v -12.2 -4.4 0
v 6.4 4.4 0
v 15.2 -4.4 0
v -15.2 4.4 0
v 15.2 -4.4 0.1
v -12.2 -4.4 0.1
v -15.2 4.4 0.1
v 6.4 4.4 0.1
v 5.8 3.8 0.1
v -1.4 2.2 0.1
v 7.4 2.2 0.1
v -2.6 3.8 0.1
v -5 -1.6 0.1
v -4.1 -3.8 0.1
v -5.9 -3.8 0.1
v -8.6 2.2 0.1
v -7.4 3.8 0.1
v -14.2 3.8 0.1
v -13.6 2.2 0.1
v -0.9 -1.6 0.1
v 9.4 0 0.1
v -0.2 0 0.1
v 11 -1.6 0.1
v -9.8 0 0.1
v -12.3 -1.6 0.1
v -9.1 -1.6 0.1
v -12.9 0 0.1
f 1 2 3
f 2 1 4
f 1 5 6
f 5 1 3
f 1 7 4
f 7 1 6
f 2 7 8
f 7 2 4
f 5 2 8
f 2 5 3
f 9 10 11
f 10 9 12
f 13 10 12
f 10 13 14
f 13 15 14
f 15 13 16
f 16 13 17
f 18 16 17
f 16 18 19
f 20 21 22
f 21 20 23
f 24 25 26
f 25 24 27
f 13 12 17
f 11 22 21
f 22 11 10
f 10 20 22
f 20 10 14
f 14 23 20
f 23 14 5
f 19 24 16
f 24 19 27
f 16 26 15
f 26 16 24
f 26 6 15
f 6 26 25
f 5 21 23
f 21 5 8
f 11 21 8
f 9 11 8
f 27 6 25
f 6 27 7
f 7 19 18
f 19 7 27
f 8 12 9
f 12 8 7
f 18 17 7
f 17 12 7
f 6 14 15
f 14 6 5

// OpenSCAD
// file: ../p/4-4edge.scad
use <../lib.scad>
$fa=1; $fs=0.2;
function ldraw_lib__4_4edge(realsolid=false) = [
// 0 Circle 1.0
// 0 Name: 4-4edge.dat
// 0 Author: James Jessiman
// 0 !LDRAW_ORG Primitive UPDATE 2017-01
// 0 !LICENSE Licensed under CC BY 2.0 and CC BY 4.0 : see CAreadme.txt
// 
// 0 BFC CERTIFY CCW
  [0,"BFC","CERTIFY"],
  [0,"BFC","CCW"],
// 
// 0 !HISTORY 1998-12-15 [PTadmin] Official Update 1998-10
// 0 !HISTORY 2005-12-28 [PTadmin] Official Update 2005-01
// 0 !HISTORY 2007-06-24 [PTadmin] Header formatted for Contributor Agreement
// 0 !HISTORY 2008-07-01 [PTadmin] Official Update 2008-01
// 0 !HISTORY 2017-01-15 [Steffen] BFCed
// 0 !HISTORY 2017-12-30 [PTadmin] Official Update 2017-01
// 
// 
// 2 24 1 0 0 0.9239 0 0.3827
  [2,24,1,0,0,0.9239,0,0.3827],
// 2 24 0.9239 0 0.3827 0.7071 0 0.7071
  [2,24,0.9239,0,0.3827,0.7071,0,0.7071],
// 2 24 0.7071 0 0.7071 0.3827 0 0.9239
  [2,24,0.7071,0,0.7071,0.3827,0,0.9239],
// 2 24 0.3827 0 0.9239 0 0 1
  [2,24,0.3827,0,0.9239,0,0,1],
// 2 24 0 0 1 -0.3827 0 0.9239
  [2,24,0,0,1,-0.3827,0,0.9239],
// 2 24 -0.3827 0 0.9239 -0.7071 0 0.7071
  [2,24,-0.3827,0,0.9239,-0.7071,0,0.7071],
// 2 24 -0.7071 0 0.7071 -0.9239 0 0.3827
  [2,24,-0.7071,0,0.7071,-0.9239,0,0.3827],
// 2 24 -0.9239 0 0.3827 -1 0 -0
  [2,24,-0.9239,0,0.3827,-1,0,-0],
// 2 24 -1 0 -0 -0.9239 0 -0.3827
  [2,24,-1,0,-0,-0.9239,0,-0.3827],
// 2 24 -0.9239 0 -0.3827 -0.7071 0 -0.7071
  [2,24,-0.9239,0,-0.3827,-0.7071,0,-0.7071],
// 2 24 -0.7071 0 -0.7071 -0.3827 0 -0.9239
  [2,24,-0.7071,0,-0.7071,-0.3827,0,-0.9239],
// 2 24 -0.3827 0 -0.9239 0 0 -1
  [2,24,-0.3827,0,-0.9239,0,0,-1],
// 2 24 0 0 -1 0.3827 0 -0.9239
  [2,24,0,0,-1,0.3827,0,-0.9239],
// 2 24 0.3827 0 -0.9239 0.7071 0 -0.7071
  [2,24,0.3827,0,-0.9239,0.7071,0,-0.7071],
// 2 24 0.7071 0 -0.7071 0.9239 0 -0.3827
  [2,24,0.7071,0,-0.7071,0.9239,0,-0.3827],
// 2 24 0.9239 0 -0.3827 1 0 0
  [2,24,0.9239,0,-0.3827,1,0,0],
];
module ldraw_lib__4_4edge(step=0, col=false, unit=2/5, alt=false, line=0.2, solid=!$preview)
    makepoly(ldraw_lib__4_4edge(solid), step=step, col=col, unit=unit, alt=alt, line=line, solid=solid);
ldraw_lib__4_4edge(line=0.2);
// file: ../p/4-4disc.scad
use <../lib.scad>
$fa=1; $fs=0.2;
function ldraw_lib__4_4disc(realsolid=false) = [
// 0 Disc 1.0
// 0 Name: 4-4disc.dat
// 0 Author: James Jessiman
// 0 !LDRAW_ORG Primitive UPDATE 2002-02
// 0 !LICENSE Licensed under CC BY 2.0 and CC BY 4.0 : see CAreadme.txt
// 
// 0 BFC CERTIFY CCW
  [0,"BFC","CERTIFY"],
  [0,"BFC","CCW"],
// 
// 0 !HISTORY 1998-12-15 [PTadmin] Official Update 1998-10
// 0 !HISTORY 2002-03-23 [sbliss] Added BFC statement
// 0 !HISTORY 2002-04-25 [PTadmin] Official Update 2002-02
// 0 !HISTORY 2007-06-24 [PTadmin] Header formatted for Contributor Agreement
// 0 !HISTORY 2008-07-01 [PTadmin] Official Update 2008-01
// 
// 
// 3 16 0 0 0 1 0 0 0.9239 0 0.3827
  [3,16,0,0,0,1,0,0,0.9239,0,0.3827],
// 3 16 0 0 0 0.9239 0 0.3827 0.7071 0 0.7071
  [3,16,0,0,0,0.9239,0,0.3827,0.7071,0,0.7071],
// 3 16 0 0 0 0.7071 0 0.7071 0.3827 0 0.9239
  [3,16,0,0,0,0.7071,0,0.7071,0.3827,0,0.9239],
// 3 16 0 0 0 0.3827 0 0.9239 0 0 1
  [3,16,0,0,0,0.3827,0,0.9239,0,0,1],
// 3 16 0 0 0 0 0 1 -0.3827 0 0.9239
  [3,16,0,0,0,0,0,1,-0.3827,0,0.9239],
// 3 16 0 0 0 -0.3827 0 0.9239 -0.7071 0 0.7071
  [3,16,0,0,0,-0.3827,0,0.9239,-0.7071,0,0.7071],
// 3 16 0 0 0 -0.7071 0 0.7071 -0.9239 0 0.3827
  [3,16,0,0,0,-0.7071,0,0.7071,-0.9239,0,0.3827],
// 3 16 0 0 0 -0.9239 0 0.3827 -1 0 -0
  [3,16,0,0,0,-0.9239,0,0.3827,-1,0,-0],
// 3 16 0 0 0 -1 0 -0 -0.9239 0 -0.3827
  [3,16,0,0,0,-1,0,-0,-0.9239,0,-0.3827],
// 3 16 0 0 0 -0.9239 0 -0.3827 -0.7071 0 -0.7071
  [3,16,0,0,0,-0.9239,0,-0.3827,-0.7071,0,-0.7071],
// 3 16 0 0 0 -0.7071 0 -0.7071 -0.3827 0 -0.9239
  [3,16,0,0,0,-0.7071,0,-0.7071,-0.3827,0,-0.9239],
// 3 16 0 0 0 -0.3827 0 -0.9239 0 0 -1
  [3,16,0,0,0,-0.3827,0,-0.9239,0,0,-1],
// 3 16 0 0 0 0 0 -1 0.3827 0 -0.9239
  [3,16,0,0,0,0,0,-1,0.3827,0,-0.9239],
// 3 16 0 0 0 0.3827 0 -0.9239 0.7071 0 -0.7071
  [3,16,0,0,0,0.3827,0,-0.9239,0.7071,0,-0.7071],
// 3 16 0 0 0 0.7071 0 -0.7071 0.9239 0 -0.3827
  [3,16,0,0,0,0.7071,0,-0.7071,0.9239,0,-0.3827],
// 3 16 0 0 0 0.9239 0 -0.3827 1 0 0
  [3,16,0,0,0,0.9239,0,-0.3827,1,0,0],
// 0
];
module ldraw_lib__4_4disc(step=0, col=false, unit=2/5, alt=false, line=0.2, solid=!$preview)
    makepoly(ldraw_lib__4_4disc(solid), step=step, col=col, unit=unit, alt=alt, line=line, solid=solid);
ldraw_lib__4_4disc(line=0.2);
// file: ../p/4-4cyli.scad
use <../lib.scad>
$fa=1; $fs=0.2;
function ldraw_lib__4_4cyli(realsolid=false) = [
// 0 Cylinder 1.0
// 0 Name: 4-4cyli.dat
// 0 Author: James Jessiman
// 0 !LDRAW_ORG Primitive UPDATE 2005-01
// 0 !LICENSE Licensed under CC BY 2.0 and CC BY 4.0 : see CAreadme.txt
// 
// 0 BFC CERTIFY CCW
  [0,"BFC","CERTIFY"],
  [0,"BFC","CCW"],
// 
// 0 !HISTORY 1998-12-15 [PTadmin] Official Update 1998-10
// 0 !HISTORY 2002-03-23 [sbliss] Added BFC statement; merged headers from files in distributions LDraw 0.27 and Complete.
// 0 !HISTORY 2002-04-25 [PTadmin] Official Update 2002-02
// 0 !HISTORY 2004-12-14 [guyvivan] BFC CCW
// 0 !HISTORY 2005-12-28 [PTadmin] Official Update 2005-01
// 0 !HISTORY 2007-06-24 [PTadmin] Header formatted for Contributor Agreement
// 0 !HISTORY 2008-07-01 [PTadmin] Official Update 2008-01
// 
// 
// 4 16 1 1 0 0.9239 1 0.3827 0.9239 0 0.3827 1 0 0
  [4,16,1,1,0,0.9239,1,0.3827,0.9239,0,0.3827,1,0,0],
// 5 24 1 0 0 1 1 0 0.9239 0 0.3827 0.9239 0 -0.3827
  [5,24,1,0,0,1,1,0,0.9239,0,0.3827,0.9239,0,-0.3827],
// 4 16 0.9239 1 0.3827 0.7071 1 0.7071 0.7071 0 0.7071 0.9239 0 0.3827
  [4,16,0.9239,1,0.3827,0.7071,1,0.7071,0.7071,0,0.7071,0.9239,0,0.3827],
// 5 24 0.9239 0 0.3827 0.9239 1 0.3827 0.7071 0 0.7071 1 0 0
  [5,24,0.9239,0,0.3827,0.9239,1,0.3827,0.7071,0,0.7071,1,0,0],
// 4 16 0.7071 1 0.7071 0.3827 1 0.9239 0.3827 0 0.9239 0.7071 0 0.7071
  [4,16,0.7071,1,0.7071,0.3827,1,0.9239,0.3827,0,0.9239,0.7071,0,0.7071],
// 5 24 0.7071 0 0.7071 0.7071 1 0.7071 0.3827 0 0.9239 0.9239 0 0.3827
  [5,24,0.7071,0,0.7071,0.7071,1,0.7071,0.3827,0,0.9239,0.9239,0,0.3827],
// 4 16 0.3827 1 0.9239 0 1 1 0 0 1 0.3827 0 0.9239
  [4,16,0.3827,1,0.9239,0,1,1,0,0,1,0.3827,0,0.9239],
// 5 24 0.3827 0 0.9239 0.3827 1 0.9239 0 0 1 0.7071 0 0.7071
  [5,24,0.3827,0,0.9239,0.3827,1,0.9239,0,0,1,0.7071,0,0.7071],
// 4 16 0 1 1 -0.3827 1 0.9239 -0.3827 0 0.9239 0 0 1
  [4,16,0,1,1,-0.3827,1,0.9239,-0.3827,0,0.9239,0,0,1],
// 5 24 0 0 1 0 1 1 -0.3827 0 0.9239 0.3827 0 0.9239
  [5,24,0,0,1,0,1,1,-0.3827,0,0.9239,0.3827,0,0.9239],
// 4 16 -0.3827 1 0.9239 -0.7071 1 0.7071 -0.7071 0 0.7071 -0.3827 0 0.9239
  [4,16,-0.3827,1,0.9239,-0.7071,1,0.7071,-0.7071,0,0.7071,-0.3827,0,0.9239],
// 5 24 -0.3827 0 0.9239 -0.3827 1 0.9239 -0.7071 0 0.7071 0 0 1
  [5,24,-0.3827,0,0.9239,-0.3827,1,0.9239,-0.7071,0,0.7071,0,0,1],
// 4 16 -0.7071 1 0.7071 -0.9239 1 0.3827 -0.9239 0 0.3827 -0.7071 0 0.7071
  [4,16,-0.7071,1,0.7071,-0.9239,1,0.3827,-0.9239,0,0.3827,-0.7071,0,0.7071],
// 5 24 -0.7071 0 0.7071 -0.7071 1 0.7071 -0.9239 0 0.3827 -0.3827 0 0.9239
  [5,24,-0.7071,0,0.7071,-0.7071,1,0.7071,-0.9239,0,0.3827,-0.3827,0,0.9239],
// 4 16 -0.9239 1 0.3827 -1 1 0 -1 0 0 -0.9239 0 0.3827
  [4,16,-0.9239,1,0.3827,-1,1,0,-1,0,0,-0.9239,0,0.3827],
// 5 24 -0.9239 0 0.3827 -0.9239 1 0.3827 -1 0 0 -0.7071 0 0.7071
  [5,24,-0.9239,0,0.3827,-0.9239,1,0.3827,-1,0,0,-0.7071,0,0.7071],
// 4 16 -1 1 0 -0.9239 1 -0.3827 -0.9239 0 -0.3827 -1 0 0
  [4,16,-1,1,0,-0.9239,1,-0.3827,-0.9239,0,-0.3827,-1,0,0],
// 5 24 -1 0 0 -1 1 0 -0.9239 0 -0.3827 -0.9239 0 0.3827
  [5,24,-1,0,0,-1,1,0,-0.9239,0,-0.3827,-0.9239,0,0.3827],
// 4 16 -0.9239 1 -0.3827 -0.7071 1 -0.7071 -0.7071 0 -0.7071 -0.9239 0 -0.3827
  [4,16,-0.9239,1,-0.3827,-0.7071,1,-0.7071,-0.7071,0,-0.7071,-0.9239,0,-0.3827],
// 5 24 -0.9239 0 -0.3827 -0.9239 1 -0.3827 -0.7071 0 -0.7071 -1 0 0
  [5,24,-0.9239,0,-0.3827,-0.9239,1,-0.3827,-0.7071,0,-0.7071,-1,0,0],
// 4 16 -0.7071 1 -0.7071 -0.3827 1 -0.9239 -0.3827 0 -0.9239 -0.7071 0 -0.7071
  [4,16,-0.7071,1,-0.7071,-0.3827,1,-0.9239,-0.3827,0,-0.9239,-0.7071,0,-0.7071],
// 5 24 -0.7071 0 -0.7071 -0.7071 1 -0.7071 -0.3827 0 -0.9239 -0.9239 0 -0.3827
  [5,24,-0.7071,0,-0.7071,-0.7071,1,-0.7071,-0.3827,0,-0.9239,-0.9239,0,-0.3827],
// 4 16 -0.3827 1 -0.9239 0 1 -1 0 0 -1 -0.3827 0 -0.9239
  [4,16,-0.3827,1,-0.9239,0,1,-1,0,0,-1,-0.3827,0,-0.9239],
// 5 24 -0.3827 0 -0.9239 -0.3827 1 -0.9239 0 0 -1 -0.7071 0 -0.7071
  [5,24,-0.3827,0,-0.9239,-0.3827,1,-0.9239,0,0,-1,-0.7071,0,-0.7071],
// 4 16 0 1 -1 0.3827 1 -0.9239 0.3827 0 -0.9239 0 0 -1
  [4,16,0,1,-1,0.3827,1,-0.9239,0.3827,0,-0.9239,0,0,-1],
// 5 24 0 0 -1 0 1 -1 0.3827 0 -0.9239 -0.3827 0 -0.9239
  [5,24,0,0,-1,0,1,-1,0.3827,0,-0.9239,-0.3827,0,-0.9239],
// 4 16 0.3827 1 -0.9239 0.7071 1 -0.7071 0.7071 0 -0.7071 0.3827 0 -0.9239
  [4,16,0.3827,1,-0.9239,0.7071,1,-0.7071,0.7071,0,-0.7071,0.3827,0,-0.9239],
// 5 24 0.3827 0 -0.9239 0.3827 1 -0.9239 0.7071 0 -0.7071 0 0 -1
  [5,24,0.3827,0,-0.9239,0.3827,1,-0.9239,0.7071,0,-0.7071,0,0,-1],
// 4 16 0.7071 1 -0.7071 0.9239 1 -0.3827 0.9239 0 -0.3827 0.7071 0 -0.7071
  [4,16,0.7071,1,-0.7071,0.9239,1,-0.3827,0.9239,0,-0.3827,0.7071,0,-0.7071],
// 5 24 0.7071 0 -0.7071 0.7071 1 -0.7071 0.9239 0 -0.3827 0.3827 0 -0.9239
  [5,24,0.7071,0,-0.7071,0.7071,1,-0.7071,0.9239,0,-0.3827,0.3827,0,-0.9239],
// 4 16 0.9239 1 -0.3827 1 1 0 1 0 0 0.9239 0 -0.3827
  [4,16,0.9239,1,-0.3827,1,1,0,1,0,0,0.9239,0,-0.3827],
// 5 24 0.9239 0 -0.3827 0.9239 1 -0.3827 1 0 0 0.7071 0 -0.7071
  [5,24,0.9239,0,-0.3827,0.9239,1,-0.3827,1,0,0,0.7071,0,-0.7071],
// 0
];
module ldraw_lib__4_4cyli(step=0, col=false, unit=2/5, alt=false, line=0.2, solid=!$preview)
    makepoly(ldraw_lib__4_4cyli(solid), step=step, col=col, unit=unit, alt=alt, line=line, solid=solid);
ldraw_lib__4_4cyli(line=0.2);
// file: ../p/stud3.scad
use <../lib.scad>
use <4-4cyli.scad>
use <4-4disc.scad>
use <4-4edge.scad>
$fa=1; $fs=0.2;
function ldraw_lib__stud3(realsolid=false) = realsolid ? 
    [openscad(translate([0,0,-eps()], o=cylinder(4+eps(), r=4)),2)] : [
// 0 Stud Tube Solid
// 0 Name: stud3.dat
// 0 Author: James Jessiman
// 0 !LDRAW_ORG Primitive UPDATE 2012-01
// 0 !LICENSE Licensed under CC BY 2.0 and CC BY 4.0 : see CAreadme.txt
// 
// 0 BFC CERTIFY CCW
  [0,"BFC","CERTIFY"],
  [0,"BFC","CCW"],
// 
// 0 !HISTORY 2002-04-04 [sbliss] Modified for BFC compliance
// 0 !HISTORY 2002-04-25 [PTadmin] Official Update 2002-02
// 0 !HISTORY 2007-06-24 [PTadmin] Header formatted for Contributor Agreement
// 0 !HISTORY 2008-07-01 [PTadmin] Official Update 2008-01
// 0 !HISTORY 2012-02-16 [Philo] Changed to CCW
// 0 !HISTORY 2012-03-30 [PTadmin] Official Update 2012-01
// 
// 
// 1 16 0 -4 0 4 0 0 0 1 0 0 0 4 4-4edge.dat
  [1,16,0,-4,0,4,0,0,0,1,0,0,0,4, ldraw_lib__4_4edge(realsolid)],
// 1 16 0 0 0 4 0 0 0 1 0 0 0 4 4-4edge.dat
  [1,16,0,0,0,4,0,0,0,1,0,0,0,4, ldraw_lib__4_4edge(realsolid)],
// 1 16 0 -4 0 4 0 0 0 1 0 0 0 4 4-4disc.dat
  [1,16,0,-4,0,4,0,0,0,1,0,0,0,4, ldraw_lib__4_4disc(realsolid)],
// 1 16 0 -4 0 4 0 0 0 4 0 0 0 4 4-4cyli.dat
  [1,16,0,-4,0,4,0,0,0,4,0,0,0,4, ldraw_lib__4_4cyli(realsolid)],
];
module ldraw_lib__stud3(step=0, col=false, unit=2/5, alt=false, line=0.2, solid=!$preview)
    makepoly(ldraw_lib__stud3(solid), step=step, col=col, unit=unit, alt=alt, line=line, solid=solid);
ldraw_lib__stud3(line=0.2);
// file: ../p/stud.scad
use <../lib.scad>
use <4-4cyli.scad>
use <4-4disc.scad>
use <4-4edge.scad>
$fa=1; $fs=0.2;
function ldraw_lib__stud(realsolid=false) = realsolid ? 
    [openscad(translate([0,0,-eps()], o=cylinder(4+eps(), r=6)),2)] : [
// 0 Stud
// 0 Name: stud.dat
// 0 Author: James Jessiman
// 0 !LDRAW_ORG Primitive UPDATE 2012-01
// 0 !LICENSE Licensed under CC BY 2.0 and CC BY 4.0 : see CAreadme.txt
// 
// 0 BFC CERTIFY CCW
  [0,"BFC","CERTIFY"],
  [0,"BFC","CCW"],
// 
// 0 !HISTORY 2002-04-04 [sbliss] Modified for BFC compliance
// 0 !HISTORY 2002-04-25 [PTadmin] Official Update 2002-02
// 0 !HISTORY 2007-06-24 [PTadmin] Header formatted for Contributor Agreement
// 0 !HISTORY 2008-07-01 [PTadmin] Official Update 2008-01
// 0 !HISTORY 2012-02-16 [Philo] Changed to CCW
// 0 !HISTORY 2012-03-30 [PTadmin] Official Update 2012-01
// 
// 
// 1 16 0 0 0 6 0 0 0 1 0 0 0 6 4-4edge.dat
  [1,16,0,0,0,6,0,0,0,1,0,0,0,6, ldraw_lib__4_4edge(realsolid)],
// 1 16 0 -4 0 6 0 0 0 1 0 0 0 6 4-4edge.dat
  [1,16,0,-4,0,6,0,0,0,1,0,0,0,6, ldraw_lib__4_4edge(realsolid)],
// 1 16 0 0 0 6 0 0 0 -4 0 0 0 6 4-4cyli.dat
  [1,16,0,0,0,6,0,0,0,-4,0,0,0,6, ldraw_lib__4_4cyli(realsolid)],
// 1 16 0 -4 0 6 0 0 0 1 0 0 0 6 4-4disc.dat
  [1,16,0,-4,0,6,0,0,0,1,0,0,0,6, ldraw_lib__4_4disc(realsolid)],
];
module ldraw_lib__stud(step=0, col=false, unit=2/5, alt=false, line=0.2, solid=!$preview)
    makepoly(ldraw_lib__stud(solid), step=step, col=col, unit=unit, alt=alt, line=line, solid=solid);
ldraw_lib__stud(line=0.2);
// file: ../p/box5.scad
use <../lib.scad>
$fa=1; $fs=0.2;
function ldraw_lib__box5(realsolid=false) = [
// 0 Box with 5 Faces and All Edges
// 0 Name: box5.dat
// 0 Author: James Jessiman
// 0 !LDRAW_ORG Primitive UPDATE 2012-01
// 0 !LICENSE Licensed under CC BY 2.0 and CC BY 4.0 : see CAreadme.txt
// 
// 0 BFC CERTIFY CCW
  [0,"BFC","CERTIFY"],
  [0,"BFC","CCW"],
// 
// 0 !HISTORY 2002-04-03 [sbliss] Modified for BFC compliance
// 0 !HISTORY 2002-04-25 [PTadmin] Official Update 2002-02
// 0 !HISTORY 2007-06-24 [PTadmin] Header formatted for Contributor Agreement
// 0 !HISTORY 2008-07-01 [PTadmin] Official Update 2008-01
// 0 !HISTORY 2012-02-16 [Philo] Changed to CCW
// 0 !HISTORY 2012-03-30 [PTadmin] Official Update 2012-01
// 
// 
// 2 24 1 1 1 -1 1 1
  [2,24,1,1,1,-1,1,1],
// 2 24 -1 1 1 -1 1 -1
  [2,24,-1,1,1,-1,1,-1],
// 2 24 -1 1 -1 1 1 -1
  [2,24,-1,1,-1,1,1,-1],
// 2 24 1 1 -1 1 1 1
  [2,24,1,1,-1,1,1,1],
// 2 24 1 0 1 -1 0 1
  [2,24,1,0,1,-1,0,1],
// 2 24 -1 0 1 -1 0 -1
  [2,24,-1,0,1,-1,0,-1],
// 2 24 -1 0 -1 1 0 -1
  [2,24,-1,0,-1,1,0,-1],
// 2 24 1 0 -1 1 0 1
  [2,24,1,0,-1,1,0,1],
// 2 24 1 0 1 1 1 1
  [2,24,1,0,1,1,1,1],
// 2 24 -1 0 1 -1 1 1
  [2,24,-1,0,1,-1,1,1],
// 2 24 1 0 -1 1 1 -1
  [2,24,1,0,-1,1,1,-1],
// 2 24 -1 0 -1 -1 1 -1
  [2,24,-1,0,-1,-1,1,-1],
// 4 16 -1 1 1 1 1 1 1 1 -1 -1 1 -1
  [4,16,-1,1,1,1,1,1,1,1,-1,-1,1,-1],
// 4 16 -1 1 1 -1 0 1 1 0 1 1 1 1
  [4,16,-1,1,1,-1,0,1,1,0,1,1,1,1],
// 4 16 -1 1 -1 -1 0 -1 -1 0 1 -1 1 1
  [4,16,-1,1,-1,-1,0,-1,-1,0,1,-1,1,1],
// 4 16 1 1 -1 1 0 -1 -1 0 -1 -1 1 -1
  [4,16,1,1,-1,1,0,-1,-1,0,-1,-1,1,-1],
// 4 16 1 1 1 1 0 1 1 0 -1 1 1 -1
  [4,16,1,1,1,1,0,1,1,0,-1,1,1,-1],
];
module ldraw_lib__box5(step=0, col=false, unit=2/5, alt=false, line=0.2, solid=!$preview)
    makepoly(ldraw_lib__box5(solid), step=step, col=col, unit=unit, alt=alt, line=line, solid=solid);
ldraw_lib__box5(line=0.2);
// file: ../p/box4t.scad
use <../lib.scad>
$fa=1; $fs=0.2;
function ldraw_lib__box4t(realsolid=false) = [
// 0 Box with 4 Adjacent Faces and All Edges
// 0 Name: box4t.dat
// 0 Author: Tore Eriksson [Tore_Eriksson]
// 0 !LDRAW_ORG Primitive UPDATE 2003-02
// 0 !LICENSE Licensed under CC BY 2.0 and CC BY 4.0 : see CAreadme.txt
// 
// 0 BFC CERTIFY CCW
  [0,"BFC","CERTIFY"],
  [0,"BFC","CCW"],
// 
// 0 !HISTORY 1997-09-29 [PTadmin] Official Update 1997-15
// 0 !HISTORY 2002-08-31 [izanette] Modified with WINDZ for BFC compliance
// 0 !HISTORY 2003-08-01 [PTadmin] Official Update 2003-02
// 0 !HISTORY 2007-06-24 [PTadmin] Header formatted for Contributor Agreement
// 0 !HISTORY 2008-07-01 [PTadmin] Official Update 2008-01
// 
// 
// 2 24 1 1 1 -1 1 1
  [2,24,1,1,1,-1,1,1],
// 2 24 -1 1 1 -1 1 -1
  [2,24,-1,1,1,-1,1,-1],
// 2 24 -1 1 -1 1 1 -1
  [2,24,-1,1,-1,1,1,-1],
// 2 24 1 1 -1 1 1 1
  [2,24,1,1,-1,1,1,1],
// 2 24 1 0 1 -1 0 1
  [2,24,1,0,1,-1,0,1],
// 2 24 -1 0 1 -1 0 -1
  [2,24,-1,0,1,-1,0,-1],
// 2 24 -1 0 -1 1 0 -1
  [2,24,-1,0,-1,1,0,-1],
// 2 24 1 0 -1 1 0 1
  [2,24,1,0,-1,1,0,1],
// 2 24 1 0 1 1 1 1
  [2,24,1,0,1,1,1,1],
// 2 24 -1 0 1 -1 1 1
  [2,24,-1,0,1,-1,1,1],
// 2 24 1 0 -1 1 1 -1
  [2,24,1,0,-1,1,1,-1],
// 2 24 -1 0 -1 -1 1 -1
  [2,24,-1,0,-1,-1,1,-1],
// 4 16 1 1 1 1 1 -1 -1 1 -1 -1 1 1
  [4,16,1,1,1,1,1,-1,-1,1,-1,-1,1,1],
// 4 16 1 1 1 -1 1 1 -1 0 1 1 0 1
  [4,16,1,1,1,-1,1,1,-1,0,1,1,0,1],
// 4 16 -1 1 1 -1 1 -1 -1 0 -1 -1 0 1
  [4,16,-1,1,1,-1,1,-1,-1,0,-1,-1,0,1],
// 0 4 16 -1 1 -1 -1 0 -1 1 0 -1 1 1 -1
// 4 16 1 1 -1 1 1 1 1 0 1 1 0 -1
  [4,16,1,1,-1,1,1,1,1,0,1,1,0,-1],
// 0
];
module ldraw_lib__box4t(step=0, col=false, unit=2/5, alt=false, line=0.2, solid=!$preview)
    makepoly(ldraw_lib__box4t(solid), step=step, col=col, unit=unit, alt=alt, line=line, solid=solid);
ldraw_lib__box4t(line=0.2);
// file: s/3004s01.scad
use <../../lib.scad>
use <../../p/box4t.scad>
use <../../p/box5.scad>
use <../../p/stud.scad>
use <../../p/stud3.scad>
$fa=1; $fs=0.2;
function ldraw_lib__s__3004s01(realsolid=false) = [
// 0 ~Brick  1 x  2 without Front Face
// 0 Name: s\3004s01.dat
// 0 Author: James Jessiman
// 0 !LDRAW_ORG Subpart UPDATE 2003-03
// 0 !LICENSE Licensed under CC BY 2.0 and CC BY 4.0 : see CAreadme.txt
// 
// 0 BFC CERTIFY CCW
  [0,"BFC","CERTIFY"],
  [0,"BFC","CCW"],
// 
// 0 !HISTORY 2003-09-07 [jriley] Subfiling, BFC
// 0 !HISTORY 2003-12-19 [PTadmin] Official Update 2003-03
// 0 !HISTORY 2007-08-29 [PTadmin] Header formatted for Contributor Agreement
// 0 !HISTORY 2008-07-01 [PTadmin] Official Update 2008-01
// 
// 
// 1 16 0 4 0 1 0 0 0 -5 0 0 0 1 stud3.dat
  [1,16,0,4,0,1,0,0,0,-5,0,0,0,1, ldraw_lib__stud3(realsolid)],
// 0 BFC INVERTNEXT
  [0,"BFC","INVERTNEXT"],
// 1 16 0 24 0 16 0 0 0 -20 0 0 0 6 box5.dat
  [1,16,0,24,0,16,0,0,0,-20,0,0,0,6, ldraw_lib__box5(realsolid)],
// 4 16 20 24 10 16 24 6 -16 24 6 -20 24 10
  [4,16,20,24,10,16,24,6,-16,24,6,-20,24,10],
// 4 16 -20 24 10 -16 24 6 -16 24 -6 -20 24 -10
  [4,16,-20,24,10,-16,24,6,-16,24,-6,-20,24,-10],
// 4 16 -20 24 -10 -16 24 -6 16 24 -6 20 24 -10
  [4,16,-20,24,-10,-16,24,-6,16,24,-6,20,24,-10],
// 4 16 20 24 -10 16 24 -6 16 24 6 20 24 10
  [4,16,20,24,-10,16,24,-6,16,24,6,20,24,10],
// 1 16 0 24 0 20 0 0 0 -24 0 0 0 10 box4t.dat
  [1,16,0,24,0,20,0,0,0,-24,0,0,0,10, ldraw_lib__box4t(realsolid)],
// 1 16 10 0 0 1 0 0 0 1 0 0 0 1 stud.dat
  [1,16,10,0,0,1,0,0,0,1,0,0,0,1, ldraw_lib__stud(realsolid)],
// 1 16 -10 0 0 1 0 0 0 1 0 0 0 1 stud.dat
  [1,16,-10,0,0,1,0,0,0,1,0,0,0,1, ldraw_lib__stud(realsolid)],
// 0
];
module ldraw_lib__s__3004s01(step=0, col=false, unit=2/5, alt=false, line=0.2, solid=!$preview)
    makepoly(ldraw_lib__s__3004s01(solid), step=step, col=col, unit=unit, alt=alt, line=line, solid=solid);
ldraw_lib__s__3004s01(line=0.2);
// file: 3004.scad
use <../lib.scad>
use <s/3004s01.scad>
$fa=1; $fs=0.2;
function ldraw_lib__3004(realsolid=false) = [
// 0 Brick  1 x  2
// 0 Name: 3004.dat
// 0 Author: James Jessiman
// 0 !LDRAW_ORG Part UPDATE 2022-05
// 0 !LICENSE Licensed under CC BY 2.0 and CC BY 4.0 : see CAreadme.txt
// 
// 0 BFC CERTIFY CCW
  [0,"BFC","CERTIFY"],
  [0,"BFC","CCW"],
// 
// 0 !HISTORY 2001-10-26 [PTadmin] Official Update 2001-01
// 0 !HISTORY 2002-05-07 {unknown} BFC Certification
// 0 !HISTORY 2002-06-11 [PTadmin] Official Update 2002-03
// 0 !HISTORY 2007-05-07 [PTadmin] Header formatted for Contributor Agreement
// 0 !HISTORY 2008-07-01 [PTadmin] Official Update 2008-01
// 0 !HISTORY 2022-08-04 [MagFors] Using subfile
// 0 !HISTORY 2022-09-15 [PTadmin] Official Update 2022-05
// 
// 
// 1 16 0 0 0 1 0 0 0 1 0 0 0 1 s\3004s01.dat
  [1,16,0,0,0,1,0,0,0,1,0,0,0,1, ldraw_lib__s__3004s01(realsolid)],
// 4 16 -20 24 -10 20 24 -10 20 0 -10 -20 0 -10
  [4,16,-20,24,-10,20,24,-10,20,0,-10,-20,0,-10],
];
module ldraw_lib__3004(step=0, col=false, unit=2/5, alt=false, line=0.2, solid=!$preview)
    makepoly(ldraw_lib__3004(solid), step=step, col=col, unit=unit, alt=alt, line=line, solid=solid);
ldraw_lib__3004(line=0.2);
// file: 165485e.scad
use <../lib.scad>
$fa=1; $fs=0.2;
function ldraw_lib__165485e(realsolid=false) = [
// 0 Sticker  1.1 x  3.8 Trapezoid with Blue V and Red Lines Left on Transparent Background
// 0 Name: 165485e.dat
// 0 Author: Takeshi Takahashi [RainbowDolphin]
// 0 !LDRAW_ORG Part UPDATE 2022-06
// 0 !LICENSE Licensed under CC BY 2.0 and CC BY 4.0 : see CAreadme.txt
// 
// 0 BFC CERTIFY CCW
  [0,"BFC","CERTIFY"],
  [0,"BFC","CCW"],
// 
// 0 !KEYWORDS Bricklink 6346stk01, Brickowl 418865, Orbiter, Rebrickable 165485
// 0 !KEYWORDS set 6346, Space Shuttle
// 
// 0 !HISTORY 2022-06-18 [RainbowDolphin] Created based on 165485a by David Manley [djm]
// 0 !HISTORY 2022-12-20 [PTadmin] Official Update 2022-06
// 
// 
// 4 16 -38 0 -11 -16 0 11 38 0 11 30.5 0 -11
  [4,16,-38,0,-11,-16,0,11,38,0,11,30.5,0,-11],
// 4 16 30.5 -.25 -11 -38 -.25 -11 -38 0 -11 30.5 0 -11
  [4,16,30.5,-.25,-11,-38,-.25,-11,-38,0,-11,30.5,0,-11],
// 4 16 38 -.25 11 30.5 -.25 -11 30.5 0 -11 38 0 11
  [4,16,38,-.25,11,30.5,-.25,-11,30.5,0,-11,38,0,11],
// 4 16 -16 -.25 11 38 -.25 11 38 0 11 -16 0 11
  [4,16,-16,-.25,11,38,-.25,11,38,0,11,-16,0,11],
// 4 16 -38 -.25 -11 -16 -.25 11 -16 0 11 -38 0 -11
  [4,16,-38,-.25,-11,-16,-.25,11,-16,0,11,-38,0,-11],
// 0 BFC NOCLIP
  [0,"BFC","NOCLIP"],
// 4 1 -18.5 -.25 5.5 3.5 -.25 5.5 6.5 -.25 9.5 -14.5 -.25 9.5
  [4,1,-18.5,-.25,5.5,3.5,-.25,5.5,6.5,-.25,9.5,-14.5,-.25,9.5],
// 4 1 10.25 -.25 -9.5 12.5 -.25 -4 6.5 -.25 9.5 3.5 -.25 5.5
  [4,1,10.25,-.25,-9.5,12.5,-.25,-4,6.5,-.25,9.5,3.5,-.25,5.5],
// 4 1 12.5 -.25 -4 10.25 -.25 -9.5 14.75 -.25 -9.5 21.5 -.25 5.5
  [4,1,12.5,-.25,-4,10.25,-.25,-9.5,14.75,-.25,-9.5,21.5,-.25,5.5],
// 3 1 18.5 -.25 9.5 12.5 -.25 -4 21.5 -.25 5.5
  [3,1,18.5,-.25,9.5,12.5,-.25,-4,21.5,-.25,5.5],
// 4 1 35.5 -.25 9.5 18.5 -.25 9.5 21.5 -.25 5.5 34 -.25 5.5
  [4,1,35.5,-.25,9.5,18.5,-.25,9.5,21.5,-.25,5.5,34,-.25,5.5],
// 4 4 -27.5 -.25 -4 2.25 -.25 -4 .5 -.25 0 -23.5 -.25 0
  [4,4,-27.5,-.25,-4,2.25,-.25,-4,.5,-.25,0,-23.5,-.25,0],
// 4 4 32.25 -.25 0 24.5 -.25 0 22.75 -.25 -4 30.75 -.25 -4
  [4,4,32.25,-.25,0,24.5,-.25,0,22.75,-.25,-4,30.75,-.25,-4],
// 0 BFC CLIP
  [0,"BFC","CLIP"],
// 3 16 18.5 -.25 9.5 6.5 -.25 9.5 12.5 -.25 -4
  [3,16,18.5,-.25,9.5,6.5,-.25,9.5,12.5,-.25,-4],
// 4 16 -23.5 -.25 0 .5 -.25 0 3.5 -.25 5.5 -18.5 -.25 5.5
  [4,16,-23.5,-.25,0,.5,-.25,0,3.5,-.25,5.5,-18.5,-.25,5.5],
// 4 16 3.5 -.25 5.5 .5 -.25 0 2.25 -.25 -4 10.25 -.25 -9.5
  [4,16,3.5,-.25,5.5,.5,-.25,0,2.25,-.25,-4,10.25,-.25,-9.5],
// 4 16 10.25 -.25 -9.5 2.25 -.25 -4 -27.5 -.25 -4 -38 -.25 -11
  [4,16,10.25,-.25,-9.5,2.25,-.25,-4,-27.5,-.25,-4,-38,-.25,-11],
// 4 16 34 -.25 5.5 21.5 -.25 5.5 24.5 -.25 0 32.25 -.25 0
  [4,16,34,-.25,5.5,21.5,-.25,5.5,24.5,-.25,0,32.25,-.25,0],
// 4 16 14.75 -.25 -9.5 22.75 -.25 -4 24.5 -.25 0 21.5 -.25 5.5
  [4,16,14.75,-.25,-9.5,22.75,-.25,-4,24.5,-.25,0,21.5,-.25,5.5],
// 4 16 30.75 -.25 -4 22.75 -.25 -4 14.75 -.25 -9.5 30.5 -.25 -11
  [4,16,30.75,-.25,-4,22.75,-.25,-4,14.75,-.25,-9.5,30.5,-.25,-11],
// 4 16 -38 -.25 -11 -27.5 -.25 -4 -23.5 -.25 0 -16 -.25 11
  [4,16,-38,-.25,-11,-27.5,-.25,-4,-23.5,-.25,0,-16,-.25,11],
// 3 16 -16 -.25 11 -23.5 -.25 0 -18.5 -.25 5.5
  [3,16,-16,-.25,11,-23.5,-.25,0,-18.5,-.25,5.5],
// 3 16 -16 -.25 11 -18.5 -.25 5.5 -14.5 -.25 9.5
  [3,16,-16,-.25,11,-18.5,-.25,5.5,-14.5,-.25,9.5],
// 4 16 38 -.25 11 32.25 -.25 0 30.75 -.25 -4 30.5 -.25 -11
  [4,16,38,-.25,11,32.25,-.25,0,30.75,-.25,-4,30.5,-.25,-11],
// 4 16 34 -.25 5.5 32.25 -.25 0 38 -.25 11 35.5 -.25 9.5
  [4,16,34,-.25,5.5,32.25,-.25,0,38,-.25,11,35.5,-.25,9.5],
// 4 16 -16 -.25 11 -14.5 -.25 9.5 6.5 -.25 9.5 38 -.25 11
  [4,16,-16,-.25,11,-14.5,-.25,9.5,6.5,-.25,9.5,38,-.25,11],
// 3 16 38 -.25 11 18.5 -.25 9.5 35.5 -.25 9.5
  [3,16,38,-.25,11,18.5,-.25,9.5,35.5,-.25,9.5],
// 3 16 38 -.25 11 6.5 -.25 9.5 18.5 -.25 9.5
  [3,16,38,-.25,11,6.5,-.25,9.5,18.5,-.25,9.5],
// 4 16 -38 -.25 -11 30.5 -.25 -11 14.75 -.25 -9.5 10.25 -.25 -9.5
  [4,16,-38,-.25,-11,30.5,-.25,-11,14.75,-.25,-9.5,10.25,-.25,-9.5],
];
module ldraw_lib__165485e(step=0, col=false, unit=2/5, alt=false, line=0.2, solid=!$preview)
    makepoly(ldraw_lib__165485e(solid), step=step, col=col, unit=unit, alt=alt, line=line, solid=solid);
ldraw_lib__165485e(line=0.2);
// main file
use <../lib.scad>
use <165485e.scad>
$fa=1; $fs=0.2;
function ldraw_lib__165485d(realsolid=false) = [
// 0 Sticker  1.1 x  3.8 Trapezoid with Blue V and Red Lines Right on Transparent Background
// 0 Name: 165485d.dat
// 0 Author: Takeshi Takahashi [RainbowDolphin]
// 0 !LDRAW_ORG Part UPDATE 2022-06
// 0 !LICENSE Licensed under CC BY 2.0 and CC BY 4.0 : see CAreadme.txt
// 
// 0 BFC CERTIFY CCW
  [0,"BFC","CERTIFY"],
  [0,"BFC","CCW"],
// 
// 0 !KEYWORDS Bricklink 6346stk01, Brickowl 418865, Orbiter, Rebrickable 165485
// 0 !KEYWORDS set 6346, Space Shuttle
// 
// 0 !HISTORY 2022-06-18 [RainbowDolphin] Created based on 165485a by David Manley [djm]
// 0 !HISTORY 2022-12-20 [PTadmin] Official Update 2022-06
// 
// 
// 1 16 0 0 0 -1 0 0 0 1 0 0 0 1 165485e.dat
  [1,16,0,0,0,-1,0,0,0,1,0,0,0,1, ldraw_lib__165485e(realsolid)],
];
module ldraw_lib__165485d(step=0, col=false, unit=2/5, alt=false, line=0.2, solid=!$preview)
    makepoly(ldraw_lib__165485d(solid), step=step, col=col, unit=unit, alt=alt, line=line, solid=solid);
ldraw_lib__165485d(line=0.2);
